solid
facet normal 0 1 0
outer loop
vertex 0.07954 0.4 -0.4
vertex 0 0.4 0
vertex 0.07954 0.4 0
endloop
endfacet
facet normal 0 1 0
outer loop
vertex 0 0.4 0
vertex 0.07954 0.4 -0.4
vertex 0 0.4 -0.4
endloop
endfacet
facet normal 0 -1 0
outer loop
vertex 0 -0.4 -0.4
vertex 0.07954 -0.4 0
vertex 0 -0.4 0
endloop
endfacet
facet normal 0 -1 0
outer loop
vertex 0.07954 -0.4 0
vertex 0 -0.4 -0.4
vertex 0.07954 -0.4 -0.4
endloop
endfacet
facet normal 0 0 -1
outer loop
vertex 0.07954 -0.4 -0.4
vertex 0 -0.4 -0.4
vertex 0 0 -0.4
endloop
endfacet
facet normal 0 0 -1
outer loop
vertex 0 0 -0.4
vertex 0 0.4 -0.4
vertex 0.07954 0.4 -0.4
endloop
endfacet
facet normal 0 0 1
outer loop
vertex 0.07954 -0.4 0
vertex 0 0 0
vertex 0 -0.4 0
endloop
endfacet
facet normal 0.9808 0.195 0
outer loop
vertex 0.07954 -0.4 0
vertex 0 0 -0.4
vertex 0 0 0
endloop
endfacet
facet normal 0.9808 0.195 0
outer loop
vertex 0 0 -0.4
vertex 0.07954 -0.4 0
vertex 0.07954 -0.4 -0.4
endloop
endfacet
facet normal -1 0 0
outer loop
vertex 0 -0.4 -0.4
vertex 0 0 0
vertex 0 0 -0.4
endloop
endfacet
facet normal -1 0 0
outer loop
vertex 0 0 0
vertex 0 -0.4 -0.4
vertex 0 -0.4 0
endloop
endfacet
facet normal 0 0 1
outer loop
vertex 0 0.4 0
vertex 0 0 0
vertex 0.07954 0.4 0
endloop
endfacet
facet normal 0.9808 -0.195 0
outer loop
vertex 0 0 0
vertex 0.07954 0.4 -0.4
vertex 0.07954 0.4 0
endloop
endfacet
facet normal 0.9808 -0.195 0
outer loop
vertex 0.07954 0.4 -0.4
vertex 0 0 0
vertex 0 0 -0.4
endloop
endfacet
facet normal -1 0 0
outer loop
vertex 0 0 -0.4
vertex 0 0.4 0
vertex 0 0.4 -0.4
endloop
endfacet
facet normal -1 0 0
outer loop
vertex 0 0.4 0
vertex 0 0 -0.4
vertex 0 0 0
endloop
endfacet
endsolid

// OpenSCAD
// file: rect3.scad
use <../lib.scad>
function ldraw_lib__rect3() = [
// 0 Rectangle with 3 Edges
// 0 Name: rect3.dat
// 0 Author: Mark Kennedy [mkennedy]
// 0 !LDRAW_ORG Primitive UPDATE 2010-01
// 0 !LICENSE Licensed under CC BY 4.0 : see CAreadme.txt
// 
// 0 BFC CERTIFY CCW
  [0,"BFC","CERTIFY"],
  [0,"BFC","CCW"],
// 
// 0 !HISTORY 2003-08-01 [PTadmin] Official Update 2003-02
// 0 !HISTORY 2007-06-24 [PTadmin] Header formatted for Contributor Agreement
// 0 !HISTORY 2008-07-01 [PTadmin] Official Update 2008-01
// 0 !HISTORY 2010-01-17 [mikeheide] Change winding to CCW
// 0 !HISTORY 2010-04-05 [PTadmin] Official Update 2010-01
// 
// 
// 2 24 1 0 1 -1 0 1
  [2,24,1,0,1,-1,0,1],
// 2 24 1 0 1 1 0 -1
  [2,24,1,0,1,1,0,-1],
// 2 24 -1 0 1 -1 0 -1
  [2,24,-1,0,1,-1,0,-1],
// 4 16 -1 0 1 -1 0 -1 1 0 -1 1 0 1
  [4,16,-1,0,1,-1,0,-1,1,0,-1,1,0,1],
// 0 //
];
module ldraw_lib__rect3(step=0, col=false, unit=2/5, alt=false, line=0.2, solid=!$preview)
    makepoly(ldraw_lib__rect3(), step=step, col=col, unit=unit, alt=alt, line=line, solid=solid);
ldraw_lib__rect3(line=0.2);
// file: 1-16edge.scad
use <../lib.scad>
function ldraw_lib__1_16edge() = [
// 0 Circle 0.0625
// 0 Name: 1-16edge.dat
// 0 Author: Marc Klein [marckl]
// 0 !LDRAW_ORG Primitive UPDATE 2017-01
// 0 !LICENSE Licensed under CC BY 4.0 : see CAreadme.txt
// 
// 0 BFC CERTIFY CCW
  [0,"BFC","CERTIFY"],
  [0,"BFC","CCW"],
// 
// 0 !HISTORY 2004-03-02 [PTadmin] Official Update 2004-01
// 0 !HISTORY 2007-06-22 [PTadmin] Header formatted for Contributor Agreement
// 0 !HISTORY 2008-07-01 [PTadmin] Official Update 2008-01
// 0 !HISTORY 2017-01-15 [Steffen] BFCed
// 0 !HISTORY 2017-12-30 [PTadmin] Official Update 2017-01
// 
// 
// 2 24 1 0 0 0.9239 0 0.3827
  [2,24,1,0,0,0.9239,0,0.3827],
];
module ldraw_lib__1_16edge(step=0, col=false, unit=2/5, alt=false, line=0.2, solid=!$preview)
    makepoly(ldraw_lib__1_16edge(), step=step, col=col, unit=unit, alt=alt, line=line, solid=solid);
ldraw_lib__1_16edge(line=0.2);
// main file
use <../lib.scad>
use <1-16edge.scad>
use <rect3.scad>
function ldraw_lib__boxjcyl4() = [
// 0 Box to Cylinder Joint 1: 4
// 0 Name: boxjcyl4.dat
// 0 Author: Philippe Hurbain [Philo]
// 0 !LDRAW_ORG Primitive UPDATE 2024-07
// 0 !LICENSE Licensed under CC BY 4.0 : see CAreadme.txt
// 
// 0 !HELP stud4 usage
// 0 !HELP 1 16 10 0 0 1 0 0 0 6 0 0 0 1 stud4.dat
// 0 !HELP 1 16 10 0 -8 0 0 1.5 0 -20 0 1.5 0 0 boxjcyl4.dat
// 0 !HELP 1 16 10 0 -12 0 0 -1.5 0 -20 0 4 0 0 box3u5p.dat
// 0 !HELP stud3 usage
// 0 !HELP 1 16 -10 0 0 1 0 0 0 6 0 0 0 1 stud3.dat
// 0 !HELP 1 16 -10 0 -4 0 0 1 0 -20 0 1 0 0 boxjcyl4.dat
// 0 !HELP 1 16 -10 0 -5 0 0 -1 0 -20 0 1 0 0 box3u5p.dat
// 
// 0 BFC CERTIFY CCW
  [0,"BFC","CERTIFY"],
  [0,"BFC","CCW"],
// 
// 0 !HISTORY 2011-12-29 [PTadmin] Official Update 2011-02
// 0 !HISTORY 2024-07-21 [Sirio] Removed wrong edge primitive, fixed Y-scale and precision of rects
// 0 !HISTORY 2024-07-29 [OrionP] Official Update 2024-06
// 0 !HISTORY 2024-08-03 [GeraldLasser] Using an unrotated edge prim for better results in Prim-Substition
// 0 !HISTORY 2024-08-26 [OrionP] Official Update 2024-07
// 
// 1 16 .099425 .5 1 0 0 .099425 -.5 0 0 0 -1 0 rect3.dat
  [1,16,.099425,.5,1,0,0,.099425,-.5,0,0,0,-1,0, ldraw_lib__rect3()],
// 1 16 .099425 .5 -1 0 0 .099425 .5 0 0 0 1 0 rect3.dat
  [1,16,.099425,.5,-1,0,0,.099425,.5,0,0,0,1,0, ldraw_lib__rect3()],
// 3 16 .19885 1 -1 0 1 -1 0 1 0
  [3,16,.19885,1,-1,0,1,-1,0,1,0],
// 3 16 0 1 0 0 1 1 .19885 1 1
  [3,16,0,1,0,0,1,1,.19885,1,1],
// 1 16 2.613 1 0 -2.613 0 0 0 1 0 0 0 2.613 1-16edge.dat
  [1,16,2.613,1,0,-2.613,0,0,0,1,0,0,0,2.613, ldraw_lib__1_16edge()],
// 1 16 2.613 1 0 -2.613 0 0 0 1 0 0 0 -2.613 1-16edge.dat
  [1,16,2.613,1,0,-2.613,0,0,0,1,0,0,0,-2.613, ldraw_lib__1_16edge()],
  [-3,16,.19885,0,-1,0,0,0,0,0,-1],
  [-4,16,.19885,0,-1,.19885,1,-1,0,1,0,0,0,0],
  [-4,16,0,1,-1,0,0,-1,0,0,0,0,1,0],
  [-3,16,0,0,1,0,0,0,.19885,0,1],
  [-4,16,.19885,1,1,.19885,0,1,0,0,0,0,1,0],
  [-4,16,0,0,1,0,1,1,0,1,0,0,0,0],
];
module ldraw_lib__boxjcyl4(step=0, col=false, unit=2/5, alt=false, line=0.2, solid=!$preview)
    makepoly(ldraw_lib__boxjcyl4(), step=step, col=col, unit=unit, alt=alt, line=line, solid=solid);
ldraw_lib__boxjcyl4(line=0.2);
